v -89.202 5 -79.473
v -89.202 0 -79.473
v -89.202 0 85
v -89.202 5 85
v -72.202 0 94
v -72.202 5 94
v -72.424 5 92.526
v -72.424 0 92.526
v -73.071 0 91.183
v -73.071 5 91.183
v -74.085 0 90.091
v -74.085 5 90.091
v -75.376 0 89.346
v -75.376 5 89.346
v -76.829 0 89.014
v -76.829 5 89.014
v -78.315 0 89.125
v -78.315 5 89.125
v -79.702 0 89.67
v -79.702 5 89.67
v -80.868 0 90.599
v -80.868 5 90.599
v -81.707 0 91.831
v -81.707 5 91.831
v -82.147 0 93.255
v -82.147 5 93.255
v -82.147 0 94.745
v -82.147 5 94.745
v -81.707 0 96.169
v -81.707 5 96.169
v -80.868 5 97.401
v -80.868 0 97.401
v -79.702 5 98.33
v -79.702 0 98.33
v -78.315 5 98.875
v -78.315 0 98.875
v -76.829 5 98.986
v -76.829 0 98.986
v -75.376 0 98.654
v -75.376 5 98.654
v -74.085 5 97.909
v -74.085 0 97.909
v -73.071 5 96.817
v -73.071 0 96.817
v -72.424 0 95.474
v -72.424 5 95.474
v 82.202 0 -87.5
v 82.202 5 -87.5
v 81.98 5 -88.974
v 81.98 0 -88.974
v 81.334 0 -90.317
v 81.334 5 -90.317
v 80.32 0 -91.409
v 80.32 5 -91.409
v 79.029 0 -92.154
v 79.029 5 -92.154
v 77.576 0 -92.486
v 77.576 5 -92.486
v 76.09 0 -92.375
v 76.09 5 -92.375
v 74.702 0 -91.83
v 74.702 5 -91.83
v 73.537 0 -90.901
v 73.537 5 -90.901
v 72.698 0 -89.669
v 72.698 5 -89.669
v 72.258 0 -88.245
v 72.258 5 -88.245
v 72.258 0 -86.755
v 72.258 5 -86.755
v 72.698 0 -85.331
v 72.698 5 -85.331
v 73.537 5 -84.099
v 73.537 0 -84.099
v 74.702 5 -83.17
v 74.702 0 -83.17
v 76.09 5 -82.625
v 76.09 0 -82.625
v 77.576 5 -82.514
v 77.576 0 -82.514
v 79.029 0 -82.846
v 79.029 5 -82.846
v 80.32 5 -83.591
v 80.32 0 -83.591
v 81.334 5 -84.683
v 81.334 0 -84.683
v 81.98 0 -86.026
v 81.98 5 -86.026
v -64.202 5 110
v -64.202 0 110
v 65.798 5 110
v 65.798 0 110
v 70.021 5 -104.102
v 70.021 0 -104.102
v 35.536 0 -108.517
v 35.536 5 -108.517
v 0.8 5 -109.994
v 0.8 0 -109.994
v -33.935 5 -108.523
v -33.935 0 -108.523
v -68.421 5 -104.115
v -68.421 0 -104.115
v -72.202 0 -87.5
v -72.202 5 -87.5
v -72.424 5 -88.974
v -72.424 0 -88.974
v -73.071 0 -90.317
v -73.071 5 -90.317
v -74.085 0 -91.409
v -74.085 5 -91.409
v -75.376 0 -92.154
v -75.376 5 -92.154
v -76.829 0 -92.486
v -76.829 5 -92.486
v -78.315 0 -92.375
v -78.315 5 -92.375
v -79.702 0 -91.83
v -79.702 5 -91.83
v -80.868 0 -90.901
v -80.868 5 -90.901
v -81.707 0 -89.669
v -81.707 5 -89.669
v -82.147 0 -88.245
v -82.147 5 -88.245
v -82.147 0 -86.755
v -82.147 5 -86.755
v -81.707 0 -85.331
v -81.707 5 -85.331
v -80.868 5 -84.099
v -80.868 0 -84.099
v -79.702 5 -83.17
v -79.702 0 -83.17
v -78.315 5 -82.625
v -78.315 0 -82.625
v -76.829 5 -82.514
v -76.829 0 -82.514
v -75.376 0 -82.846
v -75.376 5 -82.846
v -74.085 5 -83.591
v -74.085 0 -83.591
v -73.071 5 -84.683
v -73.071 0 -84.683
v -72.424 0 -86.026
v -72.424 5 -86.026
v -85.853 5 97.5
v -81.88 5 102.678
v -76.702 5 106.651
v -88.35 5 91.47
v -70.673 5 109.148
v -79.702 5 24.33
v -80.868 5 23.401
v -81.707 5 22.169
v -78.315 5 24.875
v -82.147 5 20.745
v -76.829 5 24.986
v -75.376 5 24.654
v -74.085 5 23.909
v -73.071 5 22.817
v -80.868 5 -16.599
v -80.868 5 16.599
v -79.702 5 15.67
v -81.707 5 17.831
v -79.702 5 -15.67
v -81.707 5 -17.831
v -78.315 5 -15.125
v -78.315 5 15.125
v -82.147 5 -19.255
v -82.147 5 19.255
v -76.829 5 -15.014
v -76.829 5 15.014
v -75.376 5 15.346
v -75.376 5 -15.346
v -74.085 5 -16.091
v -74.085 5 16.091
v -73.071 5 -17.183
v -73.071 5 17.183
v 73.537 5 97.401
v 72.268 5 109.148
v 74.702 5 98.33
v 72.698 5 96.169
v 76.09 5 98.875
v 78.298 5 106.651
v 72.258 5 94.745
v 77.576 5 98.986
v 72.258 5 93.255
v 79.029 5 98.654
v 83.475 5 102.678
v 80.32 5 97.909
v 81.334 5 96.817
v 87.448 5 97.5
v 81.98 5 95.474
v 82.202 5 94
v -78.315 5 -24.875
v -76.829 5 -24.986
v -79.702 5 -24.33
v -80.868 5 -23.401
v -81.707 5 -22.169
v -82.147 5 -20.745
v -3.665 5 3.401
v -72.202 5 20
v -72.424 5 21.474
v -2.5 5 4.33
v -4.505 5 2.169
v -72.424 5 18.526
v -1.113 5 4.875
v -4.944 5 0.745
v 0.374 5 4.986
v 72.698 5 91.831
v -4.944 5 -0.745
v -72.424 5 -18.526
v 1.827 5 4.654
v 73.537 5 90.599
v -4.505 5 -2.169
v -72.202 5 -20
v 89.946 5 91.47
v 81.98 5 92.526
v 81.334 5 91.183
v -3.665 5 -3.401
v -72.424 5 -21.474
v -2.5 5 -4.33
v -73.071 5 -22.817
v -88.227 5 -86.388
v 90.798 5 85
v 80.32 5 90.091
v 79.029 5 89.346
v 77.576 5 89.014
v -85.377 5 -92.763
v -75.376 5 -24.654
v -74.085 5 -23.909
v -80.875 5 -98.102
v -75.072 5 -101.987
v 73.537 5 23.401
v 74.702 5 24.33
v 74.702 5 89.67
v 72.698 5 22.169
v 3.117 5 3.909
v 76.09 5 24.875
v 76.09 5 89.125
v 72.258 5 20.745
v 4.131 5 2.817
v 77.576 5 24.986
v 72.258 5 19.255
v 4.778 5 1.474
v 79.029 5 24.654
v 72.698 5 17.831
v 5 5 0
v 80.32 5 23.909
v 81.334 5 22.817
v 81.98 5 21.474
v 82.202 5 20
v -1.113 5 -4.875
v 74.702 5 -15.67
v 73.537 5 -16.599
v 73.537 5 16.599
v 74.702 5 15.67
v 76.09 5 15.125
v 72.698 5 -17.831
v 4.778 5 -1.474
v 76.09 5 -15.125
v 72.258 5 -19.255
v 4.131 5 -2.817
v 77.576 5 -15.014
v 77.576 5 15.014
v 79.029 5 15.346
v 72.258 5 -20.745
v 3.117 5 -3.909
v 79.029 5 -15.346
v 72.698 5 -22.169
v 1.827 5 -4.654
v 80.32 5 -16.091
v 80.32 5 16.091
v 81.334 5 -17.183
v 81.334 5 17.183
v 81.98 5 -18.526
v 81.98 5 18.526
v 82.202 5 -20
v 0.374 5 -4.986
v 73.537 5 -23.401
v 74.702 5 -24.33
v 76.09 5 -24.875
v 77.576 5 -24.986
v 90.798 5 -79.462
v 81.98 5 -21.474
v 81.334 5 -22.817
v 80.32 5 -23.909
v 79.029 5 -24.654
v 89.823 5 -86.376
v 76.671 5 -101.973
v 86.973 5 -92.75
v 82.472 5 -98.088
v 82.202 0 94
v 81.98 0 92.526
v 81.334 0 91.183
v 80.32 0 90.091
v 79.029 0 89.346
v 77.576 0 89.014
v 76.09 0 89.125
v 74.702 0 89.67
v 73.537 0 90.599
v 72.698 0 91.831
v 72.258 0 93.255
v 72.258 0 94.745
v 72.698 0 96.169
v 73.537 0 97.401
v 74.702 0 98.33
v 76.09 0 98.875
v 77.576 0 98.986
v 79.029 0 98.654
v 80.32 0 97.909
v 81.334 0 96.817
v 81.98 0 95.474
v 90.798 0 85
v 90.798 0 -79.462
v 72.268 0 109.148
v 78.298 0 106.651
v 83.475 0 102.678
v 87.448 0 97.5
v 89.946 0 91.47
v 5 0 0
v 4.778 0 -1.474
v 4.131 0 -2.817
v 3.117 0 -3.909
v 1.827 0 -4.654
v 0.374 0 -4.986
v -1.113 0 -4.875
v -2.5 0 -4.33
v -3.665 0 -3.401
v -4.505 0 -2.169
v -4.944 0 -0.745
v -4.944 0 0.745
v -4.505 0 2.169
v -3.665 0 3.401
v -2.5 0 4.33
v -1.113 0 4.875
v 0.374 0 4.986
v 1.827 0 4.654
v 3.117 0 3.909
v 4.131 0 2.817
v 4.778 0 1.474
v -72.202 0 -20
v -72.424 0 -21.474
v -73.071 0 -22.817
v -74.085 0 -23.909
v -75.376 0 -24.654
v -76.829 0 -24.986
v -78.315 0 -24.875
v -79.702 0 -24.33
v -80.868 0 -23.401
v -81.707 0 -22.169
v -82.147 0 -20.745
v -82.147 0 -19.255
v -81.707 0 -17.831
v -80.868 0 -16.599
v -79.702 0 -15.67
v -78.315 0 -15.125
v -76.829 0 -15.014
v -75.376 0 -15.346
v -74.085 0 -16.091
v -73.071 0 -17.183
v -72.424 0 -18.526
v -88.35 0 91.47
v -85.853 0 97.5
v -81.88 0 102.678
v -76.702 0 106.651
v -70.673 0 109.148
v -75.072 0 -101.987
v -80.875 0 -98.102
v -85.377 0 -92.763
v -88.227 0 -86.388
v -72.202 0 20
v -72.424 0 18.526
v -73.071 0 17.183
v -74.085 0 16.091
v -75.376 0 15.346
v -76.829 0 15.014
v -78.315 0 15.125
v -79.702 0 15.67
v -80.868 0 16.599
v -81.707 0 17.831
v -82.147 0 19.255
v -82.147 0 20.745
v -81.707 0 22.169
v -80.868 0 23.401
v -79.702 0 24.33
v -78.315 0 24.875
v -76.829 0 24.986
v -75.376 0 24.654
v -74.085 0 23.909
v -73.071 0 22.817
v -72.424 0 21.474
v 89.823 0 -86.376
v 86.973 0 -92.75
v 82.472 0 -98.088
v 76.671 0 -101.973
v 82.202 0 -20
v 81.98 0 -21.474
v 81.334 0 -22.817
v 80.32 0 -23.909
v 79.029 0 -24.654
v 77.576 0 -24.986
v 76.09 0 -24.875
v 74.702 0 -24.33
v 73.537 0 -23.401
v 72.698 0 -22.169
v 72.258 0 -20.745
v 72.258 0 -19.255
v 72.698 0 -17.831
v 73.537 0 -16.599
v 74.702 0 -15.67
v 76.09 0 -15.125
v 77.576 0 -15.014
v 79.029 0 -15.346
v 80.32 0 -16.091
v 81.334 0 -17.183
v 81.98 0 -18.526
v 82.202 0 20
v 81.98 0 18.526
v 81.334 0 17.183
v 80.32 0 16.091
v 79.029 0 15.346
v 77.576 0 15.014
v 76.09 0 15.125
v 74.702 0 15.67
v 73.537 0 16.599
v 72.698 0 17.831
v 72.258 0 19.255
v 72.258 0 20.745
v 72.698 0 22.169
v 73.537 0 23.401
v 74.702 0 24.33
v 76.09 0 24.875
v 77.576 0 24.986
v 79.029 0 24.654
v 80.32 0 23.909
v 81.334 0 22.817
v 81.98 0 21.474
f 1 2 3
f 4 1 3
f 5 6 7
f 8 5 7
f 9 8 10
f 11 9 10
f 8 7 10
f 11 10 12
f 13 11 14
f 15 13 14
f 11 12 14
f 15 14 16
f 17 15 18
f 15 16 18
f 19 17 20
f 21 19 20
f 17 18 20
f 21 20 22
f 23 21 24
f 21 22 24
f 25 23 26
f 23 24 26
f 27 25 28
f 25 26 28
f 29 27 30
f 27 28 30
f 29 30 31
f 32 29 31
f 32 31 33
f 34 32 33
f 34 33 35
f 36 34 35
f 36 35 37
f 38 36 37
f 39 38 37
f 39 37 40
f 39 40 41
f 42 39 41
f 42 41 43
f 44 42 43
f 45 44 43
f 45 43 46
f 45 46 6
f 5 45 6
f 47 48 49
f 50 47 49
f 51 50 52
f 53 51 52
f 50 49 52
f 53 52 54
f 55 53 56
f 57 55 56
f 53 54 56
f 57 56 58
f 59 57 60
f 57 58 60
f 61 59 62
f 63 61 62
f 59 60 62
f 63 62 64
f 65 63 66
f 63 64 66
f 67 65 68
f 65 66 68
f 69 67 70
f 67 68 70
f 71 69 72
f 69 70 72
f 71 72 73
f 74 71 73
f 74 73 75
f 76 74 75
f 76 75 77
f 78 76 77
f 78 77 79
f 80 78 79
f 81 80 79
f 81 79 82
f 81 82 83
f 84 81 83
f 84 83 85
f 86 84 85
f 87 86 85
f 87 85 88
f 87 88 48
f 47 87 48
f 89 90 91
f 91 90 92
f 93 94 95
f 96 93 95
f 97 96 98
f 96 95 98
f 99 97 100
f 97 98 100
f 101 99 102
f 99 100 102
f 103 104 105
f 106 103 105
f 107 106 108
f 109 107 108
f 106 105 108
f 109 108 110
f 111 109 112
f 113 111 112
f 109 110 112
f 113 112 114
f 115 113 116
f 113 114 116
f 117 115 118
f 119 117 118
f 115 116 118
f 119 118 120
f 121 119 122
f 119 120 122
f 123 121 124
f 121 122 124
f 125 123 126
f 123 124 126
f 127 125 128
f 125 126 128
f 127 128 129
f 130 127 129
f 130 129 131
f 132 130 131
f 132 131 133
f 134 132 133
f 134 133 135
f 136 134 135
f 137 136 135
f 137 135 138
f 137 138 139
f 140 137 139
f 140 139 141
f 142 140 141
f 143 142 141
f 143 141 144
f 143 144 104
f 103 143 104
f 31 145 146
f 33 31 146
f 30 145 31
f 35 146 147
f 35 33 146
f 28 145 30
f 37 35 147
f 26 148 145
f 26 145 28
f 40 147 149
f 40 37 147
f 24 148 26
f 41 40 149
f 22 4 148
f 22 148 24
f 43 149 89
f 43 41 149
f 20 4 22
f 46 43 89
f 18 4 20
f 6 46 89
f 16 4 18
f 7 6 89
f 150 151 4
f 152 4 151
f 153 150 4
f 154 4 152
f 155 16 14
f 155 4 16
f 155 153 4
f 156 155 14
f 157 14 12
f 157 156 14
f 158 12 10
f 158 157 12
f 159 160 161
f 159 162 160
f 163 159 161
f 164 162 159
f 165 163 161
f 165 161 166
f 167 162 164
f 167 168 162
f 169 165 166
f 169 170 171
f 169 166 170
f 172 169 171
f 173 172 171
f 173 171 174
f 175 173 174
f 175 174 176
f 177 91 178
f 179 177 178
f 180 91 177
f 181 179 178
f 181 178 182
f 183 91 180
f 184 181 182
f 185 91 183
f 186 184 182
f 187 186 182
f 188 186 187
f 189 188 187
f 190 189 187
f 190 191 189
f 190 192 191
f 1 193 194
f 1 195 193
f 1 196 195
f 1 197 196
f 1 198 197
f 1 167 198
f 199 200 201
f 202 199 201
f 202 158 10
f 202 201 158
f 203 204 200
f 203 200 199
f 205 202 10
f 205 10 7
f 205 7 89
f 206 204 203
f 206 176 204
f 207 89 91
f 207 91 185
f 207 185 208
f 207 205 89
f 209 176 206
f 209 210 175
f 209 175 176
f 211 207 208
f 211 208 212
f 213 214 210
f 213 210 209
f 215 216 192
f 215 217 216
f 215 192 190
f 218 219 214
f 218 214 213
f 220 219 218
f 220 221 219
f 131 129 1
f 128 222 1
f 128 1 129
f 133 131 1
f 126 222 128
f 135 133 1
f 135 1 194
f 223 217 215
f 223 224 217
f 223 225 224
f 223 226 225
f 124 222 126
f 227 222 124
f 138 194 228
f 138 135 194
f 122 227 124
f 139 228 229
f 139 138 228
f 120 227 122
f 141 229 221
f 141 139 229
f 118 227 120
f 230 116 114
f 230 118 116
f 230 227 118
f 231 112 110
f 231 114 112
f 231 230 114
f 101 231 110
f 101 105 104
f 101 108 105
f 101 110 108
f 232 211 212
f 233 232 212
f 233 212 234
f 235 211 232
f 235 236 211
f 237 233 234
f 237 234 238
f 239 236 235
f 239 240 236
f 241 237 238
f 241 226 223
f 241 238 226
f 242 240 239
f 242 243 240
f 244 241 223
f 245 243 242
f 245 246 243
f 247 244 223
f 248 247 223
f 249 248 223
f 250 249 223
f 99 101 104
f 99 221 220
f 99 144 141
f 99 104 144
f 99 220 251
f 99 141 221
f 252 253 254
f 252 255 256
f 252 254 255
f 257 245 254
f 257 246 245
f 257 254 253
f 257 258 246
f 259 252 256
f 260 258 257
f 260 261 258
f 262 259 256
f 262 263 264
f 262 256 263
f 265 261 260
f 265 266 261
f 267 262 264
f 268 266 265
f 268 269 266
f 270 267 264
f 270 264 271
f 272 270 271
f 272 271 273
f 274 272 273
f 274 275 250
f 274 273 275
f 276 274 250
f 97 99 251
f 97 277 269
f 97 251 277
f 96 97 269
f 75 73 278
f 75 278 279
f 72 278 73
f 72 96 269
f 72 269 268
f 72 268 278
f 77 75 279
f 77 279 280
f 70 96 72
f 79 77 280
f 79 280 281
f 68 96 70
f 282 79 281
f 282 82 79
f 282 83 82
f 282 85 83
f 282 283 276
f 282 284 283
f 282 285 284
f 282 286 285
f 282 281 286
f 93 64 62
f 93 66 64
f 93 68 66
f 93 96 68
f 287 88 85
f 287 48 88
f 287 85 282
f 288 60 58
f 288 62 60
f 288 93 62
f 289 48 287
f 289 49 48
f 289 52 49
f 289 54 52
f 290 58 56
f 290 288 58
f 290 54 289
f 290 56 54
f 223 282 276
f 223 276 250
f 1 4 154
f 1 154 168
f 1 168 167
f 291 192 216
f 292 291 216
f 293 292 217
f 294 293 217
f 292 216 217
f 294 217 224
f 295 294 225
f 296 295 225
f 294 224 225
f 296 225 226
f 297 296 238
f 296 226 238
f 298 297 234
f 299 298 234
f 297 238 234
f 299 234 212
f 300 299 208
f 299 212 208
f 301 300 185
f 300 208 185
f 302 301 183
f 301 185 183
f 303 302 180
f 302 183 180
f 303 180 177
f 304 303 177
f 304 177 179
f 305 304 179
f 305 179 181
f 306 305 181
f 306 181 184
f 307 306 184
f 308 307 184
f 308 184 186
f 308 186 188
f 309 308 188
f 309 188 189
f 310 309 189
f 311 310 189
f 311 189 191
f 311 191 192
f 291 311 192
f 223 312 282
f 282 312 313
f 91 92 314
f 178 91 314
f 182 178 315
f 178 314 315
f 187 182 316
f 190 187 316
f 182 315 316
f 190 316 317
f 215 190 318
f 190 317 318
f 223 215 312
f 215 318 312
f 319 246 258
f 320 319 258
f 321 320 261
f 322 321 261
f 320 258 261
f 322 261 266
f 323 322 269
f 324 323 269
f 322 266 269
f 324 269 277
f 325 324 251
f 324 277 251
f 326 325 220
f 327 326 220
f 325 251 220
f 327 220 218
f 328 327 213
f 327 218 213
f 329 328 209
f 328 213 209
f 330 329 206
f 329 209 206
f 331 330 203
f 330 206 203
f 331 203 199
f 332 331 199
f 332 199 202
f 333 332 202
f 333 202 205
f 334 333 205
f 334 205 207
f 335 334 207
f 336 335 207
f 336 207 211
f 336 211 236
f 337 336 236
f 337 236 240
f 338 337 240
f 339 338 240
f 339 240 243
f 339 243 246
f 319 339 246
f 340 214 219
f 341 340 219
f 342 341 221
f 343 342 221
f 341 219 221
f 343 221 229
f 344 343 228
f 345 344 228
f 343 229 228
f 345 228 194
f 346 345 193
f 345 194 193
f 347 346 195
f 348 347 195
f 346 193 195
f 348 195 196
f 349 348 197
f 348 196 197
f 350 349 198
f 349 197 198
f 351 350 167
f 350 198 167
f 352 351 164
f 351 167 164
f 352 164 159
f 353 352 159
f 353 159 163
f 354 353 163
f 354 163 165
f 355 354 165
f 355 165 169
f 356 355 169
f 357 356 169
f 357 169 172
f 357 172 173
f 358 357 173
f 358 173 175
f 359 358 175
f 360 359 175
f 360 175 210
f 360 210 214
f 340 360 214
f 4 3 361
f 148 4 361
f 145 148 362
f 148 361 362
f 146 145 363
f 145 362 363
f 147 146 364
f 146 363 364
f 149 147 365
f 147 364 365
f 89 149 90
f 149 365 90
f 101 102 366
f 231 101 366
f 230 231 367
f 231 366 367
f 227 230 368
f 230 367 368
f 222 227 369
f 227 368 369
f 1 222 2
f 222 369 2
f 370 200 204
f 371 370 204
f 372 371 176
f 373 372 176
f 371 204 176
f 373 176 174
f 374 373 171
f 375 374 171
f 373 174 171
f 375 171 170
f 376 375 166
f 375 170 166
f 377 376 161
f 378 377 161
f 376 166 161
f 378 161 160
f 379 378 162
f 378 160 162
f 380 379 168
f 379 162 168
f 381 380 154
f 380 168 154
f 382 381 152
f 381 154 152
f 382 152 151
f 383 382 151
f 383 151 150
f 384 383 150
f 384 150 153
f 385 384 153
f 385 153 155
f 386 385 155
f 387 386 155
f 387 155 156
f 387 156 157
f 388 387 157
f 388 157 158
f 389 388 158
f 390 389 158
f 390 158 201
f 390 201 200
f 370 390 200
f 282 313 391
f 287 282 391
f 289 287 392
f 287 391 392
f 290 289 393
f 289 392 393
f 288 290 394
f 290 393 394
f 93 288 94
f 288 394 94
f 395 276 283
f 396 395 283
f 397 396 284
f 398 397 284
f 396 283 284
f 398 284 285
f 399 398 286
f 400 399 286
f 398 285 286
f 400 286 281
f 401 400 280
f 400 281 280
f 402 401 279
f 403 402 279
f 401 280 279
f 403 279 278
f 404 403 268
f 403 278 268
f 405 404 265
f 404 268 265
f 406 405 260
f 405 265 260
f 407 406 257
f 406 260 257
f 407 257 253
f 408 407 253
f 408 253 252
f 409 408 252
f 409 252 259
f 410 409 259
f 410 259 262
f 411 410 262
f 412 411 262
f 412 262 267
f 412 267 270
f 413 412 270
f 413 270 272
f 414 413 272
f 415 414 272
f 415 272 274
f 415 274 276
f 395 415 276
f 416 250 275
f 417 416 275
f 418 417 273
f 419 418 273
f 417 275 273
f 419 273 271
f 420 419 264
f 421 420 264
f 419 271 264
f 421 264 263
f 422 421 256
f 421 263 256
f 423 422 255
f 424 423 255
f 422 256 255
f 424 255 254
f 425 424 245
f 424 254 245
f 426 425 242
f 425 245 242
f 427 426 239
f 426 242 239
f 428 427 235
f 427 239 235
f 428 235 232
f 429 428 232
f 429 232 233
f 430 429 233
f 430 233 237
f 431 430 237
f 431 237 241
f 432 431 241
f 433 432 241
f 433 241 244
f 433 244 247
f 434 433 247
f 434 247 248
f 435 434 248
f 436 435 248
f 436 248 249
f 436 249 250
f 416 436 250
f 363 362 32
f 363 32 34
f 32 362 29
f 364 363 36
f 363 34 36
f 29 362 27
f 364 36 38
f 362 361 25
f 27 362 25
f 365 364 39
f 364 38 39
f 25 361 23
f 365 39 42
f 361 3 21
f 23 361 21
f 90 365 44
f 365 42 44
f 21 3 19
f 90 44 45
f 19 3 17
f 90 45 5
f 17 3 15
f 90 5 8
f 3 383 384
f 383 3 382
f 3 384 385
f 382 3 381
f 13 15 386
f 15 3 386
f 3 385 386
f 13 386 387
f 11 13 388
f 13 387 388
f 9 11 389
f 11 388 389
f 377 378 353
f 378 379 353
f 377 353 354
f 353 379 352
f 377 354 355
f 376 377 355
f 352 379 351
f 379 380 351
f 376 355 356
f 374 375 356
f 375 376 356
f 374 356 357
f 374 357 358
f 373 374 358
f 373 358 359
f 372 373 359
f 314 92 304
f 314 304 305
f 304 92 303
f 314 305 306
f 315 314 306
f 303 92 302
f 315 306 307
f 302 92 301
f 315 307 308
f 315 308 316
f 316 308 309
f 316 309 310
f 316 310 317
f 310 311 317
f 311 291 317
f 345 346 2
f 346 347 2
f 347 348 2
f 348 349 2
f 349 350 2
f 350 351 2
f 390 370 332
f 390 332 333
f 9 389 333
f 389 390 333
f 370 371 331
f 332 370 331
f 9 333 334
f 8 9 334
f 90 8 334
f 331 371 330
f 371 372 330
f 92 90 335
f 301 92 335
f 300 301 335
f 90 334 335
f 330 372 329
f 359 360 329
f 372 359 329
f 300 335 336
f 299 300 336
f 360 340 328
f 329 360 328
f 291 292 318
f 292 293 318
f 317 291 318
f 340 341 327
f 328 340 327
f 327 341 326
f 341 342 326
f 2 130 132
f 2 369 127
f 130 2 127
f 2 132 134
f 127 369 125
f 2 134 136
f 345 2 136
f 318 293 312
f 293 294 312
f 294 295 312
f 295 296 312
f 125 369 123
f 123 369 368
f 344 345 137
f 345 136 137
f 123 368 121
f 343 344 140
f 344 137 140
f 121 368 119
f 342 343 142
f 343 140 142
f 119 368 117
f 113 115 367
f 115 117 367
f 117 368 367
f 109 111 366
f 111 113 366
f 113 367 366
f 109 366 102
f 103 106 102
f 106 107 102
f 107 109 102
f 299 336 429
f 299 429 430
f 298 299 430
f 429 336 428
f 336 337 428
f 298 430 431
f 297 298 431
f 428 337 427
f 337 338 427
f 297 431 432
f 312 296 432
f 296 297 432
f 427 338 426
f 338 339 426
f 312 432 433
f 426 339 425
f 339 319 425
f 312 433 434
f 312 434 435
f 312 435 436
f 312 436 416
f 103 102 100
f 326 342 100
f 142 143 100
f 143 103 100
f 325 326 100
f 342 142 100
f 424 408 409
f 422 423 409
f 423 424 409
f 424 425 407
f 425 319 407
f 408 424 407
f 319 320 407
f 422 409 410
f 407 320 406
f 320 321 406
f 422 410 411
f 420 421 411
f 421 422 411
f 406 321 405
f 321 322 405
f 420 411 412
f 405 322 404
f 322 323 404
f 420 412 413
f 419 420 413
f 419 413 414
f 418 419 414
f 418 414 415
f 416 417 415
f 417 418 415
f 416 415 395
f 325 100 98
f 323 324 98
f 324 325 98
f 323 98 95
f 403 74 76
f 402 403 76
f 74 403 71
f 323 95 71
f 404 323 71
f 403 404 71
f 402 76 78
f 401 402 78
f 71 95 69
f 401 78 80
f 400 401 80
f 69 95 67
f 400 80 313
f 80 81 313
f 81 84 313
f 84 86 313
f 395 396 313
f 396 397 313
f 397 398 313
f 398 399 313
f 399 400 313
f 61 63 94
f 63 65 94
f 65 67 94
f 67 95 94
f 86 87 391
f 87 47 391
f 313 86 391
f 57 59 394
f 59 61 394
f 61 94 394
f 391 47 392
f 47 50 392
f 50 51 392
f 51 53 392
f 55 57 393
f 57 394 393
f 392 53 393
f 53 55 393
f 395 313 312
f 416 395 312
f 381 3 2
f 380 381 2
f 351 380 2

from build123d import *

# Parameters (mm, degrees)
BOSS_EXTRUDE1_DEPTH = 5
SKETCH5_R           = 5
CUT_EXTRUDE2_DEPTH  = 10


with BuildPart() as part:
    # Sketch1 → Boss-Extrude1 (new body)
    with BuildSketch(Plane(origin=(0, 0, 0), x_dir=(1, 0, 0), z_dir=(0, 1, 0))):
        with BuildLine():
            ThreePointArc((-89.202352286, -85), (-81.880021816, -102.67766953), (-64.202352286, -110))
            Line((-64.202352286, -110), (65.797647714, -110))
            ThreePointArc((65.797647714, -110), (83.475317244, -102.67766953), (90.797647714, -85))
            Line((90.797647714, -85), (90.797647714, -35))
            Line((90.797647714, -35), (90.797647714, 31.47331922))
            Line((90.797647714, 31.47331922), (90.797647714, 79.461679372))
            ThreePointArc((90.797647714, 79.461679372), (84.910138891, 95.577283021), (70.020633234, 104.102425978))
            ThreePointArc((70.020633234, 104.102425978), (0.80038099, 109.994179998), (-68.420925207, 104.11482166))
            ThreePointArc((-68.420925207, 104.11482166), (-83.313400439, 95.590634086), (-89.202352286, 79.47331922))
            Line((-89.202352286, 79.47331922), (-89.202352286, 31.47331922))
            Line((-89.202352286, 31.47331922), (-89.202352286, -35))
            Line((-89.202352286, -35), (-89.202352286, -85))
        make_face()
    extrude(amount=BOSS_EXTRUDE1_DEPTH)

    # Sketch5 → Cut-Extrude2 (cut)
    with BuildSketch(Plane(origin=(0, 5, 0), x_dir=(1, 0, 0), z_dir=(0, 1, 0))):
        with Locations((-77.202352286, 20)):
            Circle(SKETCH5_R)
        with Locations((-77.202352286, -20)):
            Circle(SKETCH5_R)
        with Locations((-77.202352286, 87.5)):
            Circle(SKETCH5_R)
        with Locations((-77.202352286, -94)):
            Circle(SKETCH5_R)
        Circle(SKETCH5_R)
        with Locations((77.202352286, -94)):
            Circle(SKETCH5_R)
        with Locations((77.202352286, -20)):
            Circle(SKETCH5_R)
        with Locations((77.202352286, 20)):
            Circle(SKETCH5_R)
        with Locations((77.202352286, 87.5)):
            Circle(SKETCH5_R)
    extrude(amount=-CUT_EXTRUDE2_DEPTH, mode=Mode.SUBTRACT)


solid = part.part
